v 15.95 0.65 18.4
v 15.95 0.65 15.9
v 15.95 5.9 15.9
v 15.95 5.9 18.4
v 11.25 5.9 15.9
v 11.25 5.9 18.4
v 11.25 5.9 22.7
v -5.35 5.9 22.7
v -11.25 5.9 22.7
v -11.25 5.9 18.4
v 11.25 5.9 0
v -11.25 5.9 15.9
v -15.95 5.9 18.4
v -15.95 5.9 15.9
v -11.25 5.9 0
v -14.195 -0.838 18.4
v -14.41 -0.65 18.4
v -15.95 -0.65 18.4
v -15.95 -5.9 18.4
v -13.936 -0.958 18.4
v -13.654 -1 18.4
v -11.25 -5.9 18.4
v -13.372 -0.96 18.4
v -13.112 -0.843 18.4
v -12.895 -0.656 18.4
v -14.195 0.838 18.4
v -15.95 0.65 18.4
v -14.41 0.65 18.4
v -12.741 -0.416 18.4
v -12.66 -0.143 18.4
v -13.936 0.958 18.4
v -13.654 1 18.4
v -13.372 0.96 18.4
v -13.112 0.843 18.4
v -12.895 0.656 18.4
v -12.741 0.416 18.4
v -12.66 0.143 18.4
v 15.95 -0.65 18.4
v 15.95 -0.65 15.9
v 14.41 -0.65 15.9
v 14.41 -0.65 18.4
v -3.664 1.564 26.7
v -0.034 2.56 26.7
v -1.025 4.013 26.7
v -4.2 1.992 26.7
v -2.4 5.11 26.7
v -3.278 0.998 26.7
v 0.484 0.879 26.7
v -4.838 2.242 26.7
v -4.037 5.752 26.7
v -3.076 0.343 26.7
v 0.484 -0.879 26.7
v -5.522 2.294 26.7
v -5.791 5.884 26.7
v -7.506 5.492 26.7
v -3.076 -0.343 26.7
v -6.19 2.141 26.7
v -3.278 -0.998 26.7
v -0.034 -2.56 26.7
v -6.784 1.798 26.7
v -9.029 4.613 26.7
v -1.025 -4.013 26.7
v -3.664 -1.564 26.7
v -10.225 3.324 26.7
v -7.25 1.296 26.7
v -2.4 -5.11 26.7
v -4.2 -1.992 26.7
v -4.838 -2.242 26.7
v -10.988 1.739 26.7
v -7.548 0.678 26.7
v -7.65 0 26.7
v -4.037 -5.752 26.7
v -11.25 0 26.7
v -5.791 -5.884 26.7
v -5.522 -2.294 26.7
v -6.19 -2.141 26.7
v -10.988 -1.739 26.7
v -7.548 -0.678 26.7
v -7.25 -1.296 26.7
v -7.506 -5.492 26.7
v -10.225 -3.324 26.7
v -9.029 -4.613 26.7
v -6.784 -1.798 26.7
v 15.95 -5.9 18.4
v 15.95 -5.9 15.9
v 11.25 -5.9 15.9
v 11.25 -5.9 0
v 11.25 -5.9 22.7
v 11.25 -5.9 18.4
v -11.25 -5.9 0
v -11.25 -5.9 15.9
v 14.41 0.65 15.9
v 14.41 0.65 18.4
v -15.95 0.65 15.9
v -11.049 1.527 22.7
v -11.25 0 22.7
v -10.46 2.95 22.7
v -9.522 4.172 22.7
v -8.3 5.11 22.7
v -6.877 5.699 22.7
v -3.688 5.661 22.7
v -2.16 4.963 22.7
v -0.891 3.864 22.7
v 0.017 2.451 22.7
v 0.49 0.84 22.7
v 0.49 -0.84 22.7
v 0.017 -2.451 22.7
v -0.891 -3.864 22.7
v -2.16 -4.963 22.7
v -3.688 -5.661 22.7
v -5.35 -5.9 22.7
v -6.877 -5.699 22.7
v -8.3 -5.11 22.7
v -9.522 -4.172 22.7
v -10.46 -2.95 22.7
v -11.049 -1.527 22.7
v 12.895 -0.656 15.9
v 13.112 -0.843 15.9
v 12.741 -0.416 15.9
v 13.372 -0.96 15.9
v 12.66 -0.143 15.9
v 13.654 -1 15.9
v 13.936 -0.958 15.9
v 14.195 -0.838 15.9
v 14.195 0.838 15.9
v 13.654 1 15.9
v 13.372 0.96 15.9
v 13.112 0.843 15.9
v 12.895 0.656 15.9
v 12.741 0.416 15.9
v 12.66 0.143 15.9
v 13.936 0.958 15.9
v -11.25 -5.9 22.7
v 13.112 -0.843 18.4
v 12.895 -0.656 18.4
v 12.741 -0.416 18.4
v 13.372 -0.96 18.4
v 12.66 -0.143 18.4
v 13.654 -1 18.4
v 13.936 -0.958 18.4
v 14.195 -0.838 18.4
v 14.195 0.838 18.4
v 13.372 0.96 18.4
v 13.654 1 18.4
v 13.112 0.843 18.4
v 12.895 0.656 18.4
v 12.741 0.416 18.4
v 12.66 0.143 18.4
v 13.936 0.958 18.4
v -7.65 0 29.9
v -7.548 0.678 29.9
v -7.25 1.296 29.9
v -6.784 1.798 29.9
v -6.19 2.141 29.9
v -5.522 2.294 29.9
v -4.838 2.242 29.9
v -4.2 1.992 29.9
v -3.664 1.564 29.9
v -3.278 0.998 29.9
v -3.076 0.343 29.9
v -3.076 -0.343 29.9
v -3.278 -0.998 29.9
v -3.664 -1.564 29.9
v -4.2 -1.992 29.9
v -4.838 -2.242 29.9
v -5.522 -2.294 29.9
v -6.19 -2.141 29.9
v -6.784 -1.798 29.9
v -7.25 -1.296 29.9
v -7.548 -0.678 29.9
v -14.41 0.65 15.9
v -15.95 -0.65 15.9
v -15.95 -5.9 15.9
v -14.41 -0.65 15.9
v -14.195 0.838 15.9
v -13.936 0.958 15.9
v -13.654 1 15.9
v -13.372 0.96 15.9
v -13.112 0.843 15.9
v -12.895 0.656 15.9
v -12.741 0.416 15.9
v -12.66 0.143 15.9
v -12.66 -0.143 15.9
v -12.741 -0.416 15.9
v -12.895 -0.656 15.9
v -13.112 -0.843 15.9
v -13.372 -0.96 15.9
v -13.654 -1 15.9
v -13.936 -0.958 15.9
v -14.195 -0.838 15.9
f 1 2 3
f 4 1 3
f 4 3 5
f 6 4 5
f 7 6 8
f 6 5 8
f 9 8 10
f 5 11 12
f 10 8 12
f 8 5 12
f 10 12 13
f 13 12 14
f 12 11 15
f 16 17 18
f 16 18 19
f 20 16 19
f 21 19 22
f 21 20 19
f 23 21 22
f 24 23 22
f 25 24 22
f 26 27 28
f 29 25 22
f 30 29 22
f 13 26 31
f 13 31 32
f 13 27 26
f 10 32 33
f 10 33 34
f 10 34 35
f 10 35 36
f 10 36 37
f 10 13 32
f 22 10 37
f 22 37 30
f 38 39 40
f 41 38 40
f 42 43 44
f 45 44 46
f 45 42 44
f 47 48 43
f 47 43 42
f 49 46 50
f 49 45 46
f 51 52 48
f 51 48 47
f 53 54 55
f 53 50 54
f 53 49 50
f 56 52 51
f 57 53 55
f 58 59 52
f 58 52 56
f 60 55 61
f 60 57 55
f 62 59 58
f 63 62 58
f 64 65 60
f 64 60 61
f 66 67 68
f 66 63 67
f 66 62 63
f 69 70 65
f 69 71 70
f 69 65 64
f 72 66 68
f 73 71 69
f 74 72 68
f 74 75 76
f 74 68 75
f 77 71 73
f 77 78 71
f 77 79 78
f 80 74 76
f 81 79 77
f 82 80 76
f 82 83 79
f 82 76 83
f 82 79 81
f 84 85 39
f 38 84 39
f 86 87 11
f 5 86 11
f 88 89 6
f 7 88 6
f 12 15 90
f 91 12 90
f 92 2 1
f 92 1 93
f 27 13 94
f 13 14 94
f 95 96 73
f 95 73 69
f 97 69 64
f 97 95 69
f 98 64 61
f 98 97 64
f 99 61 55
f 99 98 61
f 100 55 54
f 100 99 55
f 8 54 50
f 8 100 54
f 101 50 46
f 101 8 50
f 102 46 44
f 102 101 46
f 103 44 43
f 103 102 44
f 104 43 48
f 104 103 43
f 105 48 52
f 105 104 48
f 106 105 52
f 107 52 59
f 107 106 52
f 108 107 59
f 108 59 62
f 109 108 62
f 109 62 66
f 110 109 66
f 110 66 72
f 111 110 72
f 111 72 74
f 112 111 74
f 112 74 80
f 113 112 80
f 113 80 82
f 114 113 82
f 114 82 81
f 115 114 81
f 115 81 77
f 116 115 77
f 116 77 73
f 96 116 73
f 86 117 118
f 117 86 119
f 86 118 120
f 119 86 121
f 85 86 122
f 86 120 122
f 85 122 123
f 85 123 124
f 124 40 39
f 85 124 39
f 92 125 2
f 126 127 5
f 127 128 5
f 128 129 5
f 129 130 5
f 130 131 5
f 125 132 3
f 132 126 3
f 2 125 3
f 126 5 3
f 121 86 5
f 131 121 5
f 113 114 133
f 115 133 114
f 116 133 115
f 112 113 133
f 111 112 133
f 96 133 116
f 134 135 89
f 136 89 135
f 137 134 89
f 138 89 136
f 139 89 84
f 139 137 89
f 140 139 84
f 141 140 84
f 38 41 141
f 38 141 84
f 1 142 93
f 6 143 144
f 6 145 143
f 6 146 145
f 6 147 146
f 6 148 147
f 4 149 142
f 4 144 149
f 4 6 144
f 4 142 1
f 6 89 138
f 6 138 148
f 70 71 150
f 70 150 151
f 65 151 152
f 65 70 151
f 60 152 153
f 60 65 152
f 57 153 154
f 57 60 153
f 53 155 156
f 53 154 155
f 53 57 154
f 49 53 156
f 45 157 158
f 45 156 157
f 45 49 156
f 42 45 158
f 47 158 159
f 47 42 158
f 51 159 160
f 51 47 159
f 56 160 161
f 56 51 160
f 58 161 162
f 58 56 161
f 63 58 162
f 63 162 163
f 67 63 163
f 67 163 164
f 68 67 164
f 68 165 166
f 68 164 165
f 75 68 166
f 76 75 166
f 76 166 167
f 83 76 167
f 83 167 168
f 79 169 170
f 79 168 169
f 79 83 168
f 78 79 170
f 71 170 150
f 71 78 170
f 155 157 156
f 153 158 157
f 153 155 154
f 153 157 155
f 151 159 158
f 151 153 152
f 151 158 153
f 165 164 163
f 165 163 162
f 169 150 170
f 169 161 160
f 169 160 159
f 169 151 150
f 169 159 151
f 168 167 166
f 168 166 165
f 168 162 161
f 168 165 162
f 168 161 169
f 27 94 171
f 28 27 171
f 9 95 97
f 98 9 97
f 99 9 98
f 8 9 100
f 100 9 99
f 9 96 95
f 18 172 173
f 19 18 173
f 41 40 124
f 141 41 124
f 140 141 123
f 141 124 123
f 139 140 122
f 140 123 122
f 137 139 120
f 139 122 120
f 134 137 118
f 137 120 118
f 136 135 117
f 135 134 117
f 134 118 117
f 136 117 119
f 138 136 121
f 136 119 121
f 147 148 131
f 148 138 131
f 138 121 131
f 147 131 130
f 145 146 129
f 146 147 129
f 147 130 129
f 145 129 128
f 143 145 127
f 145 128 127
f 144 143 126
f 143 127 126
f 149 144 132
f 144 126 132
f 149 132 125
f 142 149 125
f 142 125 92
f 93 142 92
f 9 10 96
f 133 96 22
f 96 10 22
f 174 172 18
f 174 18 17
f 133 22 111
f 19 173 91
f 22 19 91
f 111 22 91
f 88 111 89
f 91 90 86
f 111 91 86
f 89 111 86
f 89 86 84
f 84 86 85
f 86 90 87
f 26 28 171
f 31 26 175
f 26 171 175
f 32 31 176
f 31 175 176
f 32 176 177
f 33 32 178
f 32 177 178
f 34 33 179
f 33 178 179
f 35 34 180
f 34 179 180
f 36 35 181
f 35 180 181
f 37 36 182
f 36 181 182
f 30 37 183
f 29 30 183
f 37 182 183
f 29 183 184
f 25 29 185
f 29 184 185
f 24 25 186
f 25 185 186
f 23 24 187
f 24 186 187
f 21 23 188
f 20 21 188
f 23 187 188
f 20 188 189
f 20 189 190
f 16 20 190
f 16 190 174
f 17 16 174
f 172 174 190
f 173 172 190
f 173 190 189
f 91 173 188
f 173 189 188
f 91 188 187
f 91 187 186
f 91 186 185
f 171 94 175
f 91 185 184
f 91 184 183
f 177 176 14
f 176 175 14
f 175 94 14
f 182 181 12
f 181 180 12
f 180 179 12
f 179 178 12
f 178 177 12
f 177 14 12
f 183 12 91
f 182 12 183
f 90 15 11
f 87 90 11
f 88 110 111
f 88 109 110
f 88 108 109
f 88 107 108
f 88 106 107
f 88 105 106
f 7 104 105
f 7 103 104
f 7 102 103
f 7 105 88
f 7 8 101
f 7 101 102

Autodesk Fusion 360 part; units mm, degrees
sketch "Sketch1" plane through (0, 0, 0) normal (0, 0, 1) x (1, 0, 0)
  line L0 (11.25, 5.9) -> (-11.25, 5.9)
  line L1 (-11.25, 5.9) -> (-11.25, -5.9)
  line L2 (-11.25, -5.9) -> (11.25, -5.9)
  line L3 (11.25, -5.9) -> (11.25, 5.9)
  line L4 (11.25, 5.9) -> (-11.25, -5.9) construction
  line L5 (-11.25, 5.9) -> (11.25, -5.9) construction
  dimension "d1" = 22.5
  dimension "d2" = 11.8
extrude "Extrude1" add sketch "Sketch1" along normal blind 22.7 makes body 1
sketch "Sketch2" plane through (0, 0, 0) normal (0, 0, 1) x (1, 0, 0)
sketch "Sketch3" plane through (0, 0, 0) normal (0, 0, 1) x (1, 0, 0)
  line L0 (-15.95, -5.9) -> (15.95, -5.9)
  line L1 (15.95, -5.9) -> (15.95, 5.9)
  line L2 (15.95, 5.9) -> (-15.95, 5.9)
  line L3 (-15.95, 5.9) -> (-15.95, -5.9)
  line L4 (-15.95, -5.9) -> (15.95, 5.9) construction
  line L5 (15.95, -5.9) -> (-15.95, 5.9) construction
  line L6 (-15.95, 0) -> (-15.95, -0.65) construction
  line L7 (-15.95, -0.65) -> (-13.65, -0.65)
  circle A0 centre (-13.65, 0) radius 1
  line L8 (-15.95, 0) -> (-15.95, 0.65) construction
  line L9 (-15.95, 0.65) -> (-13.65, 0.65)
  line L10 (15.95, 0) -> (15.95, -0.65) construction
  line L11 (15.95, -0.65) -> (13.65, -0.65)
  line L12 (15.95, 0) -> (15.95, 0.65)
  line L13 (15.95, 0.65) -> (13.65, 0.65)
  line L14 (13.65, -0.65) -> (13.65, 0.65) construction
  circle A1 centre (13.65, 0) radius 1
  line L15 (15.95, 0.65) -> (15.95, -0.65)
  line L16 (-15.95, 0.65) -> (-15.95, -0.65)
  dimension "d5" = 31.9
  dimension "d6" = 11.8
  dimension "d9" = 0.65
  dimension "d10" = 2.3
  dimension "d11" = 2
  dimension "d12" = 0.65
  dimension "d13" = 0.65
  dimension "d14" = 2.3
  dimension "d15" = 0.65
  dimension "d16" = 2.3
  dimension "d17" = 2
extrude "Extrude2" add sketch "Sketch3" along normal blind 2.5 separate body contours L0 L1 L2 L3 L7 A0 L9 L11 L13 A1 makes body 2
move_body "Move1" bodies 2 to x (1, 0, 0) y (0, 1, 0) z (0, 0, 1) at (0, 0, 15.9)
sketch "Sketch4" plane through (0, 0, 22.7) normal (0, 0, 1) x (-1, 0, 0)
  line L0 (-11.25, 5.9) -> (-11.25, -5.9)
  line L1 (-11.25, -5.9) -> (11.25, -5.9)
  line L2 (11.25, -5.9) -> (11.25, 5.9)
  line L3 (11.25, 5.9) -> (-11.25, 5.9)
  line L4 (11.25, 0) -> (5.35, 0) construction
  circle A0 centre (5.35, 0) radius 5.9
  dimension "d18" = 5.9
  dimension "d19" = 11.8
extrude "Extrude3" add sketch "Sketch4" along normal blind 4 contours A0 bodies 1
combine "Combine1" operation add target body 1 tool bodies 2
sketch "Sketch6" plane through (0, 0, 26.7) normal (0, 0, 1) x (-1, 0, 0)
  circle A0 centre (5.35, 0) radius 5.9
  circle A1 centre (5.35, 0) radius 2.3
  dimension "d22" = 4.6
extrude "Extrude4" add sketch "Sketch6" along normal blind 3.2 contours A1 bodies 1
